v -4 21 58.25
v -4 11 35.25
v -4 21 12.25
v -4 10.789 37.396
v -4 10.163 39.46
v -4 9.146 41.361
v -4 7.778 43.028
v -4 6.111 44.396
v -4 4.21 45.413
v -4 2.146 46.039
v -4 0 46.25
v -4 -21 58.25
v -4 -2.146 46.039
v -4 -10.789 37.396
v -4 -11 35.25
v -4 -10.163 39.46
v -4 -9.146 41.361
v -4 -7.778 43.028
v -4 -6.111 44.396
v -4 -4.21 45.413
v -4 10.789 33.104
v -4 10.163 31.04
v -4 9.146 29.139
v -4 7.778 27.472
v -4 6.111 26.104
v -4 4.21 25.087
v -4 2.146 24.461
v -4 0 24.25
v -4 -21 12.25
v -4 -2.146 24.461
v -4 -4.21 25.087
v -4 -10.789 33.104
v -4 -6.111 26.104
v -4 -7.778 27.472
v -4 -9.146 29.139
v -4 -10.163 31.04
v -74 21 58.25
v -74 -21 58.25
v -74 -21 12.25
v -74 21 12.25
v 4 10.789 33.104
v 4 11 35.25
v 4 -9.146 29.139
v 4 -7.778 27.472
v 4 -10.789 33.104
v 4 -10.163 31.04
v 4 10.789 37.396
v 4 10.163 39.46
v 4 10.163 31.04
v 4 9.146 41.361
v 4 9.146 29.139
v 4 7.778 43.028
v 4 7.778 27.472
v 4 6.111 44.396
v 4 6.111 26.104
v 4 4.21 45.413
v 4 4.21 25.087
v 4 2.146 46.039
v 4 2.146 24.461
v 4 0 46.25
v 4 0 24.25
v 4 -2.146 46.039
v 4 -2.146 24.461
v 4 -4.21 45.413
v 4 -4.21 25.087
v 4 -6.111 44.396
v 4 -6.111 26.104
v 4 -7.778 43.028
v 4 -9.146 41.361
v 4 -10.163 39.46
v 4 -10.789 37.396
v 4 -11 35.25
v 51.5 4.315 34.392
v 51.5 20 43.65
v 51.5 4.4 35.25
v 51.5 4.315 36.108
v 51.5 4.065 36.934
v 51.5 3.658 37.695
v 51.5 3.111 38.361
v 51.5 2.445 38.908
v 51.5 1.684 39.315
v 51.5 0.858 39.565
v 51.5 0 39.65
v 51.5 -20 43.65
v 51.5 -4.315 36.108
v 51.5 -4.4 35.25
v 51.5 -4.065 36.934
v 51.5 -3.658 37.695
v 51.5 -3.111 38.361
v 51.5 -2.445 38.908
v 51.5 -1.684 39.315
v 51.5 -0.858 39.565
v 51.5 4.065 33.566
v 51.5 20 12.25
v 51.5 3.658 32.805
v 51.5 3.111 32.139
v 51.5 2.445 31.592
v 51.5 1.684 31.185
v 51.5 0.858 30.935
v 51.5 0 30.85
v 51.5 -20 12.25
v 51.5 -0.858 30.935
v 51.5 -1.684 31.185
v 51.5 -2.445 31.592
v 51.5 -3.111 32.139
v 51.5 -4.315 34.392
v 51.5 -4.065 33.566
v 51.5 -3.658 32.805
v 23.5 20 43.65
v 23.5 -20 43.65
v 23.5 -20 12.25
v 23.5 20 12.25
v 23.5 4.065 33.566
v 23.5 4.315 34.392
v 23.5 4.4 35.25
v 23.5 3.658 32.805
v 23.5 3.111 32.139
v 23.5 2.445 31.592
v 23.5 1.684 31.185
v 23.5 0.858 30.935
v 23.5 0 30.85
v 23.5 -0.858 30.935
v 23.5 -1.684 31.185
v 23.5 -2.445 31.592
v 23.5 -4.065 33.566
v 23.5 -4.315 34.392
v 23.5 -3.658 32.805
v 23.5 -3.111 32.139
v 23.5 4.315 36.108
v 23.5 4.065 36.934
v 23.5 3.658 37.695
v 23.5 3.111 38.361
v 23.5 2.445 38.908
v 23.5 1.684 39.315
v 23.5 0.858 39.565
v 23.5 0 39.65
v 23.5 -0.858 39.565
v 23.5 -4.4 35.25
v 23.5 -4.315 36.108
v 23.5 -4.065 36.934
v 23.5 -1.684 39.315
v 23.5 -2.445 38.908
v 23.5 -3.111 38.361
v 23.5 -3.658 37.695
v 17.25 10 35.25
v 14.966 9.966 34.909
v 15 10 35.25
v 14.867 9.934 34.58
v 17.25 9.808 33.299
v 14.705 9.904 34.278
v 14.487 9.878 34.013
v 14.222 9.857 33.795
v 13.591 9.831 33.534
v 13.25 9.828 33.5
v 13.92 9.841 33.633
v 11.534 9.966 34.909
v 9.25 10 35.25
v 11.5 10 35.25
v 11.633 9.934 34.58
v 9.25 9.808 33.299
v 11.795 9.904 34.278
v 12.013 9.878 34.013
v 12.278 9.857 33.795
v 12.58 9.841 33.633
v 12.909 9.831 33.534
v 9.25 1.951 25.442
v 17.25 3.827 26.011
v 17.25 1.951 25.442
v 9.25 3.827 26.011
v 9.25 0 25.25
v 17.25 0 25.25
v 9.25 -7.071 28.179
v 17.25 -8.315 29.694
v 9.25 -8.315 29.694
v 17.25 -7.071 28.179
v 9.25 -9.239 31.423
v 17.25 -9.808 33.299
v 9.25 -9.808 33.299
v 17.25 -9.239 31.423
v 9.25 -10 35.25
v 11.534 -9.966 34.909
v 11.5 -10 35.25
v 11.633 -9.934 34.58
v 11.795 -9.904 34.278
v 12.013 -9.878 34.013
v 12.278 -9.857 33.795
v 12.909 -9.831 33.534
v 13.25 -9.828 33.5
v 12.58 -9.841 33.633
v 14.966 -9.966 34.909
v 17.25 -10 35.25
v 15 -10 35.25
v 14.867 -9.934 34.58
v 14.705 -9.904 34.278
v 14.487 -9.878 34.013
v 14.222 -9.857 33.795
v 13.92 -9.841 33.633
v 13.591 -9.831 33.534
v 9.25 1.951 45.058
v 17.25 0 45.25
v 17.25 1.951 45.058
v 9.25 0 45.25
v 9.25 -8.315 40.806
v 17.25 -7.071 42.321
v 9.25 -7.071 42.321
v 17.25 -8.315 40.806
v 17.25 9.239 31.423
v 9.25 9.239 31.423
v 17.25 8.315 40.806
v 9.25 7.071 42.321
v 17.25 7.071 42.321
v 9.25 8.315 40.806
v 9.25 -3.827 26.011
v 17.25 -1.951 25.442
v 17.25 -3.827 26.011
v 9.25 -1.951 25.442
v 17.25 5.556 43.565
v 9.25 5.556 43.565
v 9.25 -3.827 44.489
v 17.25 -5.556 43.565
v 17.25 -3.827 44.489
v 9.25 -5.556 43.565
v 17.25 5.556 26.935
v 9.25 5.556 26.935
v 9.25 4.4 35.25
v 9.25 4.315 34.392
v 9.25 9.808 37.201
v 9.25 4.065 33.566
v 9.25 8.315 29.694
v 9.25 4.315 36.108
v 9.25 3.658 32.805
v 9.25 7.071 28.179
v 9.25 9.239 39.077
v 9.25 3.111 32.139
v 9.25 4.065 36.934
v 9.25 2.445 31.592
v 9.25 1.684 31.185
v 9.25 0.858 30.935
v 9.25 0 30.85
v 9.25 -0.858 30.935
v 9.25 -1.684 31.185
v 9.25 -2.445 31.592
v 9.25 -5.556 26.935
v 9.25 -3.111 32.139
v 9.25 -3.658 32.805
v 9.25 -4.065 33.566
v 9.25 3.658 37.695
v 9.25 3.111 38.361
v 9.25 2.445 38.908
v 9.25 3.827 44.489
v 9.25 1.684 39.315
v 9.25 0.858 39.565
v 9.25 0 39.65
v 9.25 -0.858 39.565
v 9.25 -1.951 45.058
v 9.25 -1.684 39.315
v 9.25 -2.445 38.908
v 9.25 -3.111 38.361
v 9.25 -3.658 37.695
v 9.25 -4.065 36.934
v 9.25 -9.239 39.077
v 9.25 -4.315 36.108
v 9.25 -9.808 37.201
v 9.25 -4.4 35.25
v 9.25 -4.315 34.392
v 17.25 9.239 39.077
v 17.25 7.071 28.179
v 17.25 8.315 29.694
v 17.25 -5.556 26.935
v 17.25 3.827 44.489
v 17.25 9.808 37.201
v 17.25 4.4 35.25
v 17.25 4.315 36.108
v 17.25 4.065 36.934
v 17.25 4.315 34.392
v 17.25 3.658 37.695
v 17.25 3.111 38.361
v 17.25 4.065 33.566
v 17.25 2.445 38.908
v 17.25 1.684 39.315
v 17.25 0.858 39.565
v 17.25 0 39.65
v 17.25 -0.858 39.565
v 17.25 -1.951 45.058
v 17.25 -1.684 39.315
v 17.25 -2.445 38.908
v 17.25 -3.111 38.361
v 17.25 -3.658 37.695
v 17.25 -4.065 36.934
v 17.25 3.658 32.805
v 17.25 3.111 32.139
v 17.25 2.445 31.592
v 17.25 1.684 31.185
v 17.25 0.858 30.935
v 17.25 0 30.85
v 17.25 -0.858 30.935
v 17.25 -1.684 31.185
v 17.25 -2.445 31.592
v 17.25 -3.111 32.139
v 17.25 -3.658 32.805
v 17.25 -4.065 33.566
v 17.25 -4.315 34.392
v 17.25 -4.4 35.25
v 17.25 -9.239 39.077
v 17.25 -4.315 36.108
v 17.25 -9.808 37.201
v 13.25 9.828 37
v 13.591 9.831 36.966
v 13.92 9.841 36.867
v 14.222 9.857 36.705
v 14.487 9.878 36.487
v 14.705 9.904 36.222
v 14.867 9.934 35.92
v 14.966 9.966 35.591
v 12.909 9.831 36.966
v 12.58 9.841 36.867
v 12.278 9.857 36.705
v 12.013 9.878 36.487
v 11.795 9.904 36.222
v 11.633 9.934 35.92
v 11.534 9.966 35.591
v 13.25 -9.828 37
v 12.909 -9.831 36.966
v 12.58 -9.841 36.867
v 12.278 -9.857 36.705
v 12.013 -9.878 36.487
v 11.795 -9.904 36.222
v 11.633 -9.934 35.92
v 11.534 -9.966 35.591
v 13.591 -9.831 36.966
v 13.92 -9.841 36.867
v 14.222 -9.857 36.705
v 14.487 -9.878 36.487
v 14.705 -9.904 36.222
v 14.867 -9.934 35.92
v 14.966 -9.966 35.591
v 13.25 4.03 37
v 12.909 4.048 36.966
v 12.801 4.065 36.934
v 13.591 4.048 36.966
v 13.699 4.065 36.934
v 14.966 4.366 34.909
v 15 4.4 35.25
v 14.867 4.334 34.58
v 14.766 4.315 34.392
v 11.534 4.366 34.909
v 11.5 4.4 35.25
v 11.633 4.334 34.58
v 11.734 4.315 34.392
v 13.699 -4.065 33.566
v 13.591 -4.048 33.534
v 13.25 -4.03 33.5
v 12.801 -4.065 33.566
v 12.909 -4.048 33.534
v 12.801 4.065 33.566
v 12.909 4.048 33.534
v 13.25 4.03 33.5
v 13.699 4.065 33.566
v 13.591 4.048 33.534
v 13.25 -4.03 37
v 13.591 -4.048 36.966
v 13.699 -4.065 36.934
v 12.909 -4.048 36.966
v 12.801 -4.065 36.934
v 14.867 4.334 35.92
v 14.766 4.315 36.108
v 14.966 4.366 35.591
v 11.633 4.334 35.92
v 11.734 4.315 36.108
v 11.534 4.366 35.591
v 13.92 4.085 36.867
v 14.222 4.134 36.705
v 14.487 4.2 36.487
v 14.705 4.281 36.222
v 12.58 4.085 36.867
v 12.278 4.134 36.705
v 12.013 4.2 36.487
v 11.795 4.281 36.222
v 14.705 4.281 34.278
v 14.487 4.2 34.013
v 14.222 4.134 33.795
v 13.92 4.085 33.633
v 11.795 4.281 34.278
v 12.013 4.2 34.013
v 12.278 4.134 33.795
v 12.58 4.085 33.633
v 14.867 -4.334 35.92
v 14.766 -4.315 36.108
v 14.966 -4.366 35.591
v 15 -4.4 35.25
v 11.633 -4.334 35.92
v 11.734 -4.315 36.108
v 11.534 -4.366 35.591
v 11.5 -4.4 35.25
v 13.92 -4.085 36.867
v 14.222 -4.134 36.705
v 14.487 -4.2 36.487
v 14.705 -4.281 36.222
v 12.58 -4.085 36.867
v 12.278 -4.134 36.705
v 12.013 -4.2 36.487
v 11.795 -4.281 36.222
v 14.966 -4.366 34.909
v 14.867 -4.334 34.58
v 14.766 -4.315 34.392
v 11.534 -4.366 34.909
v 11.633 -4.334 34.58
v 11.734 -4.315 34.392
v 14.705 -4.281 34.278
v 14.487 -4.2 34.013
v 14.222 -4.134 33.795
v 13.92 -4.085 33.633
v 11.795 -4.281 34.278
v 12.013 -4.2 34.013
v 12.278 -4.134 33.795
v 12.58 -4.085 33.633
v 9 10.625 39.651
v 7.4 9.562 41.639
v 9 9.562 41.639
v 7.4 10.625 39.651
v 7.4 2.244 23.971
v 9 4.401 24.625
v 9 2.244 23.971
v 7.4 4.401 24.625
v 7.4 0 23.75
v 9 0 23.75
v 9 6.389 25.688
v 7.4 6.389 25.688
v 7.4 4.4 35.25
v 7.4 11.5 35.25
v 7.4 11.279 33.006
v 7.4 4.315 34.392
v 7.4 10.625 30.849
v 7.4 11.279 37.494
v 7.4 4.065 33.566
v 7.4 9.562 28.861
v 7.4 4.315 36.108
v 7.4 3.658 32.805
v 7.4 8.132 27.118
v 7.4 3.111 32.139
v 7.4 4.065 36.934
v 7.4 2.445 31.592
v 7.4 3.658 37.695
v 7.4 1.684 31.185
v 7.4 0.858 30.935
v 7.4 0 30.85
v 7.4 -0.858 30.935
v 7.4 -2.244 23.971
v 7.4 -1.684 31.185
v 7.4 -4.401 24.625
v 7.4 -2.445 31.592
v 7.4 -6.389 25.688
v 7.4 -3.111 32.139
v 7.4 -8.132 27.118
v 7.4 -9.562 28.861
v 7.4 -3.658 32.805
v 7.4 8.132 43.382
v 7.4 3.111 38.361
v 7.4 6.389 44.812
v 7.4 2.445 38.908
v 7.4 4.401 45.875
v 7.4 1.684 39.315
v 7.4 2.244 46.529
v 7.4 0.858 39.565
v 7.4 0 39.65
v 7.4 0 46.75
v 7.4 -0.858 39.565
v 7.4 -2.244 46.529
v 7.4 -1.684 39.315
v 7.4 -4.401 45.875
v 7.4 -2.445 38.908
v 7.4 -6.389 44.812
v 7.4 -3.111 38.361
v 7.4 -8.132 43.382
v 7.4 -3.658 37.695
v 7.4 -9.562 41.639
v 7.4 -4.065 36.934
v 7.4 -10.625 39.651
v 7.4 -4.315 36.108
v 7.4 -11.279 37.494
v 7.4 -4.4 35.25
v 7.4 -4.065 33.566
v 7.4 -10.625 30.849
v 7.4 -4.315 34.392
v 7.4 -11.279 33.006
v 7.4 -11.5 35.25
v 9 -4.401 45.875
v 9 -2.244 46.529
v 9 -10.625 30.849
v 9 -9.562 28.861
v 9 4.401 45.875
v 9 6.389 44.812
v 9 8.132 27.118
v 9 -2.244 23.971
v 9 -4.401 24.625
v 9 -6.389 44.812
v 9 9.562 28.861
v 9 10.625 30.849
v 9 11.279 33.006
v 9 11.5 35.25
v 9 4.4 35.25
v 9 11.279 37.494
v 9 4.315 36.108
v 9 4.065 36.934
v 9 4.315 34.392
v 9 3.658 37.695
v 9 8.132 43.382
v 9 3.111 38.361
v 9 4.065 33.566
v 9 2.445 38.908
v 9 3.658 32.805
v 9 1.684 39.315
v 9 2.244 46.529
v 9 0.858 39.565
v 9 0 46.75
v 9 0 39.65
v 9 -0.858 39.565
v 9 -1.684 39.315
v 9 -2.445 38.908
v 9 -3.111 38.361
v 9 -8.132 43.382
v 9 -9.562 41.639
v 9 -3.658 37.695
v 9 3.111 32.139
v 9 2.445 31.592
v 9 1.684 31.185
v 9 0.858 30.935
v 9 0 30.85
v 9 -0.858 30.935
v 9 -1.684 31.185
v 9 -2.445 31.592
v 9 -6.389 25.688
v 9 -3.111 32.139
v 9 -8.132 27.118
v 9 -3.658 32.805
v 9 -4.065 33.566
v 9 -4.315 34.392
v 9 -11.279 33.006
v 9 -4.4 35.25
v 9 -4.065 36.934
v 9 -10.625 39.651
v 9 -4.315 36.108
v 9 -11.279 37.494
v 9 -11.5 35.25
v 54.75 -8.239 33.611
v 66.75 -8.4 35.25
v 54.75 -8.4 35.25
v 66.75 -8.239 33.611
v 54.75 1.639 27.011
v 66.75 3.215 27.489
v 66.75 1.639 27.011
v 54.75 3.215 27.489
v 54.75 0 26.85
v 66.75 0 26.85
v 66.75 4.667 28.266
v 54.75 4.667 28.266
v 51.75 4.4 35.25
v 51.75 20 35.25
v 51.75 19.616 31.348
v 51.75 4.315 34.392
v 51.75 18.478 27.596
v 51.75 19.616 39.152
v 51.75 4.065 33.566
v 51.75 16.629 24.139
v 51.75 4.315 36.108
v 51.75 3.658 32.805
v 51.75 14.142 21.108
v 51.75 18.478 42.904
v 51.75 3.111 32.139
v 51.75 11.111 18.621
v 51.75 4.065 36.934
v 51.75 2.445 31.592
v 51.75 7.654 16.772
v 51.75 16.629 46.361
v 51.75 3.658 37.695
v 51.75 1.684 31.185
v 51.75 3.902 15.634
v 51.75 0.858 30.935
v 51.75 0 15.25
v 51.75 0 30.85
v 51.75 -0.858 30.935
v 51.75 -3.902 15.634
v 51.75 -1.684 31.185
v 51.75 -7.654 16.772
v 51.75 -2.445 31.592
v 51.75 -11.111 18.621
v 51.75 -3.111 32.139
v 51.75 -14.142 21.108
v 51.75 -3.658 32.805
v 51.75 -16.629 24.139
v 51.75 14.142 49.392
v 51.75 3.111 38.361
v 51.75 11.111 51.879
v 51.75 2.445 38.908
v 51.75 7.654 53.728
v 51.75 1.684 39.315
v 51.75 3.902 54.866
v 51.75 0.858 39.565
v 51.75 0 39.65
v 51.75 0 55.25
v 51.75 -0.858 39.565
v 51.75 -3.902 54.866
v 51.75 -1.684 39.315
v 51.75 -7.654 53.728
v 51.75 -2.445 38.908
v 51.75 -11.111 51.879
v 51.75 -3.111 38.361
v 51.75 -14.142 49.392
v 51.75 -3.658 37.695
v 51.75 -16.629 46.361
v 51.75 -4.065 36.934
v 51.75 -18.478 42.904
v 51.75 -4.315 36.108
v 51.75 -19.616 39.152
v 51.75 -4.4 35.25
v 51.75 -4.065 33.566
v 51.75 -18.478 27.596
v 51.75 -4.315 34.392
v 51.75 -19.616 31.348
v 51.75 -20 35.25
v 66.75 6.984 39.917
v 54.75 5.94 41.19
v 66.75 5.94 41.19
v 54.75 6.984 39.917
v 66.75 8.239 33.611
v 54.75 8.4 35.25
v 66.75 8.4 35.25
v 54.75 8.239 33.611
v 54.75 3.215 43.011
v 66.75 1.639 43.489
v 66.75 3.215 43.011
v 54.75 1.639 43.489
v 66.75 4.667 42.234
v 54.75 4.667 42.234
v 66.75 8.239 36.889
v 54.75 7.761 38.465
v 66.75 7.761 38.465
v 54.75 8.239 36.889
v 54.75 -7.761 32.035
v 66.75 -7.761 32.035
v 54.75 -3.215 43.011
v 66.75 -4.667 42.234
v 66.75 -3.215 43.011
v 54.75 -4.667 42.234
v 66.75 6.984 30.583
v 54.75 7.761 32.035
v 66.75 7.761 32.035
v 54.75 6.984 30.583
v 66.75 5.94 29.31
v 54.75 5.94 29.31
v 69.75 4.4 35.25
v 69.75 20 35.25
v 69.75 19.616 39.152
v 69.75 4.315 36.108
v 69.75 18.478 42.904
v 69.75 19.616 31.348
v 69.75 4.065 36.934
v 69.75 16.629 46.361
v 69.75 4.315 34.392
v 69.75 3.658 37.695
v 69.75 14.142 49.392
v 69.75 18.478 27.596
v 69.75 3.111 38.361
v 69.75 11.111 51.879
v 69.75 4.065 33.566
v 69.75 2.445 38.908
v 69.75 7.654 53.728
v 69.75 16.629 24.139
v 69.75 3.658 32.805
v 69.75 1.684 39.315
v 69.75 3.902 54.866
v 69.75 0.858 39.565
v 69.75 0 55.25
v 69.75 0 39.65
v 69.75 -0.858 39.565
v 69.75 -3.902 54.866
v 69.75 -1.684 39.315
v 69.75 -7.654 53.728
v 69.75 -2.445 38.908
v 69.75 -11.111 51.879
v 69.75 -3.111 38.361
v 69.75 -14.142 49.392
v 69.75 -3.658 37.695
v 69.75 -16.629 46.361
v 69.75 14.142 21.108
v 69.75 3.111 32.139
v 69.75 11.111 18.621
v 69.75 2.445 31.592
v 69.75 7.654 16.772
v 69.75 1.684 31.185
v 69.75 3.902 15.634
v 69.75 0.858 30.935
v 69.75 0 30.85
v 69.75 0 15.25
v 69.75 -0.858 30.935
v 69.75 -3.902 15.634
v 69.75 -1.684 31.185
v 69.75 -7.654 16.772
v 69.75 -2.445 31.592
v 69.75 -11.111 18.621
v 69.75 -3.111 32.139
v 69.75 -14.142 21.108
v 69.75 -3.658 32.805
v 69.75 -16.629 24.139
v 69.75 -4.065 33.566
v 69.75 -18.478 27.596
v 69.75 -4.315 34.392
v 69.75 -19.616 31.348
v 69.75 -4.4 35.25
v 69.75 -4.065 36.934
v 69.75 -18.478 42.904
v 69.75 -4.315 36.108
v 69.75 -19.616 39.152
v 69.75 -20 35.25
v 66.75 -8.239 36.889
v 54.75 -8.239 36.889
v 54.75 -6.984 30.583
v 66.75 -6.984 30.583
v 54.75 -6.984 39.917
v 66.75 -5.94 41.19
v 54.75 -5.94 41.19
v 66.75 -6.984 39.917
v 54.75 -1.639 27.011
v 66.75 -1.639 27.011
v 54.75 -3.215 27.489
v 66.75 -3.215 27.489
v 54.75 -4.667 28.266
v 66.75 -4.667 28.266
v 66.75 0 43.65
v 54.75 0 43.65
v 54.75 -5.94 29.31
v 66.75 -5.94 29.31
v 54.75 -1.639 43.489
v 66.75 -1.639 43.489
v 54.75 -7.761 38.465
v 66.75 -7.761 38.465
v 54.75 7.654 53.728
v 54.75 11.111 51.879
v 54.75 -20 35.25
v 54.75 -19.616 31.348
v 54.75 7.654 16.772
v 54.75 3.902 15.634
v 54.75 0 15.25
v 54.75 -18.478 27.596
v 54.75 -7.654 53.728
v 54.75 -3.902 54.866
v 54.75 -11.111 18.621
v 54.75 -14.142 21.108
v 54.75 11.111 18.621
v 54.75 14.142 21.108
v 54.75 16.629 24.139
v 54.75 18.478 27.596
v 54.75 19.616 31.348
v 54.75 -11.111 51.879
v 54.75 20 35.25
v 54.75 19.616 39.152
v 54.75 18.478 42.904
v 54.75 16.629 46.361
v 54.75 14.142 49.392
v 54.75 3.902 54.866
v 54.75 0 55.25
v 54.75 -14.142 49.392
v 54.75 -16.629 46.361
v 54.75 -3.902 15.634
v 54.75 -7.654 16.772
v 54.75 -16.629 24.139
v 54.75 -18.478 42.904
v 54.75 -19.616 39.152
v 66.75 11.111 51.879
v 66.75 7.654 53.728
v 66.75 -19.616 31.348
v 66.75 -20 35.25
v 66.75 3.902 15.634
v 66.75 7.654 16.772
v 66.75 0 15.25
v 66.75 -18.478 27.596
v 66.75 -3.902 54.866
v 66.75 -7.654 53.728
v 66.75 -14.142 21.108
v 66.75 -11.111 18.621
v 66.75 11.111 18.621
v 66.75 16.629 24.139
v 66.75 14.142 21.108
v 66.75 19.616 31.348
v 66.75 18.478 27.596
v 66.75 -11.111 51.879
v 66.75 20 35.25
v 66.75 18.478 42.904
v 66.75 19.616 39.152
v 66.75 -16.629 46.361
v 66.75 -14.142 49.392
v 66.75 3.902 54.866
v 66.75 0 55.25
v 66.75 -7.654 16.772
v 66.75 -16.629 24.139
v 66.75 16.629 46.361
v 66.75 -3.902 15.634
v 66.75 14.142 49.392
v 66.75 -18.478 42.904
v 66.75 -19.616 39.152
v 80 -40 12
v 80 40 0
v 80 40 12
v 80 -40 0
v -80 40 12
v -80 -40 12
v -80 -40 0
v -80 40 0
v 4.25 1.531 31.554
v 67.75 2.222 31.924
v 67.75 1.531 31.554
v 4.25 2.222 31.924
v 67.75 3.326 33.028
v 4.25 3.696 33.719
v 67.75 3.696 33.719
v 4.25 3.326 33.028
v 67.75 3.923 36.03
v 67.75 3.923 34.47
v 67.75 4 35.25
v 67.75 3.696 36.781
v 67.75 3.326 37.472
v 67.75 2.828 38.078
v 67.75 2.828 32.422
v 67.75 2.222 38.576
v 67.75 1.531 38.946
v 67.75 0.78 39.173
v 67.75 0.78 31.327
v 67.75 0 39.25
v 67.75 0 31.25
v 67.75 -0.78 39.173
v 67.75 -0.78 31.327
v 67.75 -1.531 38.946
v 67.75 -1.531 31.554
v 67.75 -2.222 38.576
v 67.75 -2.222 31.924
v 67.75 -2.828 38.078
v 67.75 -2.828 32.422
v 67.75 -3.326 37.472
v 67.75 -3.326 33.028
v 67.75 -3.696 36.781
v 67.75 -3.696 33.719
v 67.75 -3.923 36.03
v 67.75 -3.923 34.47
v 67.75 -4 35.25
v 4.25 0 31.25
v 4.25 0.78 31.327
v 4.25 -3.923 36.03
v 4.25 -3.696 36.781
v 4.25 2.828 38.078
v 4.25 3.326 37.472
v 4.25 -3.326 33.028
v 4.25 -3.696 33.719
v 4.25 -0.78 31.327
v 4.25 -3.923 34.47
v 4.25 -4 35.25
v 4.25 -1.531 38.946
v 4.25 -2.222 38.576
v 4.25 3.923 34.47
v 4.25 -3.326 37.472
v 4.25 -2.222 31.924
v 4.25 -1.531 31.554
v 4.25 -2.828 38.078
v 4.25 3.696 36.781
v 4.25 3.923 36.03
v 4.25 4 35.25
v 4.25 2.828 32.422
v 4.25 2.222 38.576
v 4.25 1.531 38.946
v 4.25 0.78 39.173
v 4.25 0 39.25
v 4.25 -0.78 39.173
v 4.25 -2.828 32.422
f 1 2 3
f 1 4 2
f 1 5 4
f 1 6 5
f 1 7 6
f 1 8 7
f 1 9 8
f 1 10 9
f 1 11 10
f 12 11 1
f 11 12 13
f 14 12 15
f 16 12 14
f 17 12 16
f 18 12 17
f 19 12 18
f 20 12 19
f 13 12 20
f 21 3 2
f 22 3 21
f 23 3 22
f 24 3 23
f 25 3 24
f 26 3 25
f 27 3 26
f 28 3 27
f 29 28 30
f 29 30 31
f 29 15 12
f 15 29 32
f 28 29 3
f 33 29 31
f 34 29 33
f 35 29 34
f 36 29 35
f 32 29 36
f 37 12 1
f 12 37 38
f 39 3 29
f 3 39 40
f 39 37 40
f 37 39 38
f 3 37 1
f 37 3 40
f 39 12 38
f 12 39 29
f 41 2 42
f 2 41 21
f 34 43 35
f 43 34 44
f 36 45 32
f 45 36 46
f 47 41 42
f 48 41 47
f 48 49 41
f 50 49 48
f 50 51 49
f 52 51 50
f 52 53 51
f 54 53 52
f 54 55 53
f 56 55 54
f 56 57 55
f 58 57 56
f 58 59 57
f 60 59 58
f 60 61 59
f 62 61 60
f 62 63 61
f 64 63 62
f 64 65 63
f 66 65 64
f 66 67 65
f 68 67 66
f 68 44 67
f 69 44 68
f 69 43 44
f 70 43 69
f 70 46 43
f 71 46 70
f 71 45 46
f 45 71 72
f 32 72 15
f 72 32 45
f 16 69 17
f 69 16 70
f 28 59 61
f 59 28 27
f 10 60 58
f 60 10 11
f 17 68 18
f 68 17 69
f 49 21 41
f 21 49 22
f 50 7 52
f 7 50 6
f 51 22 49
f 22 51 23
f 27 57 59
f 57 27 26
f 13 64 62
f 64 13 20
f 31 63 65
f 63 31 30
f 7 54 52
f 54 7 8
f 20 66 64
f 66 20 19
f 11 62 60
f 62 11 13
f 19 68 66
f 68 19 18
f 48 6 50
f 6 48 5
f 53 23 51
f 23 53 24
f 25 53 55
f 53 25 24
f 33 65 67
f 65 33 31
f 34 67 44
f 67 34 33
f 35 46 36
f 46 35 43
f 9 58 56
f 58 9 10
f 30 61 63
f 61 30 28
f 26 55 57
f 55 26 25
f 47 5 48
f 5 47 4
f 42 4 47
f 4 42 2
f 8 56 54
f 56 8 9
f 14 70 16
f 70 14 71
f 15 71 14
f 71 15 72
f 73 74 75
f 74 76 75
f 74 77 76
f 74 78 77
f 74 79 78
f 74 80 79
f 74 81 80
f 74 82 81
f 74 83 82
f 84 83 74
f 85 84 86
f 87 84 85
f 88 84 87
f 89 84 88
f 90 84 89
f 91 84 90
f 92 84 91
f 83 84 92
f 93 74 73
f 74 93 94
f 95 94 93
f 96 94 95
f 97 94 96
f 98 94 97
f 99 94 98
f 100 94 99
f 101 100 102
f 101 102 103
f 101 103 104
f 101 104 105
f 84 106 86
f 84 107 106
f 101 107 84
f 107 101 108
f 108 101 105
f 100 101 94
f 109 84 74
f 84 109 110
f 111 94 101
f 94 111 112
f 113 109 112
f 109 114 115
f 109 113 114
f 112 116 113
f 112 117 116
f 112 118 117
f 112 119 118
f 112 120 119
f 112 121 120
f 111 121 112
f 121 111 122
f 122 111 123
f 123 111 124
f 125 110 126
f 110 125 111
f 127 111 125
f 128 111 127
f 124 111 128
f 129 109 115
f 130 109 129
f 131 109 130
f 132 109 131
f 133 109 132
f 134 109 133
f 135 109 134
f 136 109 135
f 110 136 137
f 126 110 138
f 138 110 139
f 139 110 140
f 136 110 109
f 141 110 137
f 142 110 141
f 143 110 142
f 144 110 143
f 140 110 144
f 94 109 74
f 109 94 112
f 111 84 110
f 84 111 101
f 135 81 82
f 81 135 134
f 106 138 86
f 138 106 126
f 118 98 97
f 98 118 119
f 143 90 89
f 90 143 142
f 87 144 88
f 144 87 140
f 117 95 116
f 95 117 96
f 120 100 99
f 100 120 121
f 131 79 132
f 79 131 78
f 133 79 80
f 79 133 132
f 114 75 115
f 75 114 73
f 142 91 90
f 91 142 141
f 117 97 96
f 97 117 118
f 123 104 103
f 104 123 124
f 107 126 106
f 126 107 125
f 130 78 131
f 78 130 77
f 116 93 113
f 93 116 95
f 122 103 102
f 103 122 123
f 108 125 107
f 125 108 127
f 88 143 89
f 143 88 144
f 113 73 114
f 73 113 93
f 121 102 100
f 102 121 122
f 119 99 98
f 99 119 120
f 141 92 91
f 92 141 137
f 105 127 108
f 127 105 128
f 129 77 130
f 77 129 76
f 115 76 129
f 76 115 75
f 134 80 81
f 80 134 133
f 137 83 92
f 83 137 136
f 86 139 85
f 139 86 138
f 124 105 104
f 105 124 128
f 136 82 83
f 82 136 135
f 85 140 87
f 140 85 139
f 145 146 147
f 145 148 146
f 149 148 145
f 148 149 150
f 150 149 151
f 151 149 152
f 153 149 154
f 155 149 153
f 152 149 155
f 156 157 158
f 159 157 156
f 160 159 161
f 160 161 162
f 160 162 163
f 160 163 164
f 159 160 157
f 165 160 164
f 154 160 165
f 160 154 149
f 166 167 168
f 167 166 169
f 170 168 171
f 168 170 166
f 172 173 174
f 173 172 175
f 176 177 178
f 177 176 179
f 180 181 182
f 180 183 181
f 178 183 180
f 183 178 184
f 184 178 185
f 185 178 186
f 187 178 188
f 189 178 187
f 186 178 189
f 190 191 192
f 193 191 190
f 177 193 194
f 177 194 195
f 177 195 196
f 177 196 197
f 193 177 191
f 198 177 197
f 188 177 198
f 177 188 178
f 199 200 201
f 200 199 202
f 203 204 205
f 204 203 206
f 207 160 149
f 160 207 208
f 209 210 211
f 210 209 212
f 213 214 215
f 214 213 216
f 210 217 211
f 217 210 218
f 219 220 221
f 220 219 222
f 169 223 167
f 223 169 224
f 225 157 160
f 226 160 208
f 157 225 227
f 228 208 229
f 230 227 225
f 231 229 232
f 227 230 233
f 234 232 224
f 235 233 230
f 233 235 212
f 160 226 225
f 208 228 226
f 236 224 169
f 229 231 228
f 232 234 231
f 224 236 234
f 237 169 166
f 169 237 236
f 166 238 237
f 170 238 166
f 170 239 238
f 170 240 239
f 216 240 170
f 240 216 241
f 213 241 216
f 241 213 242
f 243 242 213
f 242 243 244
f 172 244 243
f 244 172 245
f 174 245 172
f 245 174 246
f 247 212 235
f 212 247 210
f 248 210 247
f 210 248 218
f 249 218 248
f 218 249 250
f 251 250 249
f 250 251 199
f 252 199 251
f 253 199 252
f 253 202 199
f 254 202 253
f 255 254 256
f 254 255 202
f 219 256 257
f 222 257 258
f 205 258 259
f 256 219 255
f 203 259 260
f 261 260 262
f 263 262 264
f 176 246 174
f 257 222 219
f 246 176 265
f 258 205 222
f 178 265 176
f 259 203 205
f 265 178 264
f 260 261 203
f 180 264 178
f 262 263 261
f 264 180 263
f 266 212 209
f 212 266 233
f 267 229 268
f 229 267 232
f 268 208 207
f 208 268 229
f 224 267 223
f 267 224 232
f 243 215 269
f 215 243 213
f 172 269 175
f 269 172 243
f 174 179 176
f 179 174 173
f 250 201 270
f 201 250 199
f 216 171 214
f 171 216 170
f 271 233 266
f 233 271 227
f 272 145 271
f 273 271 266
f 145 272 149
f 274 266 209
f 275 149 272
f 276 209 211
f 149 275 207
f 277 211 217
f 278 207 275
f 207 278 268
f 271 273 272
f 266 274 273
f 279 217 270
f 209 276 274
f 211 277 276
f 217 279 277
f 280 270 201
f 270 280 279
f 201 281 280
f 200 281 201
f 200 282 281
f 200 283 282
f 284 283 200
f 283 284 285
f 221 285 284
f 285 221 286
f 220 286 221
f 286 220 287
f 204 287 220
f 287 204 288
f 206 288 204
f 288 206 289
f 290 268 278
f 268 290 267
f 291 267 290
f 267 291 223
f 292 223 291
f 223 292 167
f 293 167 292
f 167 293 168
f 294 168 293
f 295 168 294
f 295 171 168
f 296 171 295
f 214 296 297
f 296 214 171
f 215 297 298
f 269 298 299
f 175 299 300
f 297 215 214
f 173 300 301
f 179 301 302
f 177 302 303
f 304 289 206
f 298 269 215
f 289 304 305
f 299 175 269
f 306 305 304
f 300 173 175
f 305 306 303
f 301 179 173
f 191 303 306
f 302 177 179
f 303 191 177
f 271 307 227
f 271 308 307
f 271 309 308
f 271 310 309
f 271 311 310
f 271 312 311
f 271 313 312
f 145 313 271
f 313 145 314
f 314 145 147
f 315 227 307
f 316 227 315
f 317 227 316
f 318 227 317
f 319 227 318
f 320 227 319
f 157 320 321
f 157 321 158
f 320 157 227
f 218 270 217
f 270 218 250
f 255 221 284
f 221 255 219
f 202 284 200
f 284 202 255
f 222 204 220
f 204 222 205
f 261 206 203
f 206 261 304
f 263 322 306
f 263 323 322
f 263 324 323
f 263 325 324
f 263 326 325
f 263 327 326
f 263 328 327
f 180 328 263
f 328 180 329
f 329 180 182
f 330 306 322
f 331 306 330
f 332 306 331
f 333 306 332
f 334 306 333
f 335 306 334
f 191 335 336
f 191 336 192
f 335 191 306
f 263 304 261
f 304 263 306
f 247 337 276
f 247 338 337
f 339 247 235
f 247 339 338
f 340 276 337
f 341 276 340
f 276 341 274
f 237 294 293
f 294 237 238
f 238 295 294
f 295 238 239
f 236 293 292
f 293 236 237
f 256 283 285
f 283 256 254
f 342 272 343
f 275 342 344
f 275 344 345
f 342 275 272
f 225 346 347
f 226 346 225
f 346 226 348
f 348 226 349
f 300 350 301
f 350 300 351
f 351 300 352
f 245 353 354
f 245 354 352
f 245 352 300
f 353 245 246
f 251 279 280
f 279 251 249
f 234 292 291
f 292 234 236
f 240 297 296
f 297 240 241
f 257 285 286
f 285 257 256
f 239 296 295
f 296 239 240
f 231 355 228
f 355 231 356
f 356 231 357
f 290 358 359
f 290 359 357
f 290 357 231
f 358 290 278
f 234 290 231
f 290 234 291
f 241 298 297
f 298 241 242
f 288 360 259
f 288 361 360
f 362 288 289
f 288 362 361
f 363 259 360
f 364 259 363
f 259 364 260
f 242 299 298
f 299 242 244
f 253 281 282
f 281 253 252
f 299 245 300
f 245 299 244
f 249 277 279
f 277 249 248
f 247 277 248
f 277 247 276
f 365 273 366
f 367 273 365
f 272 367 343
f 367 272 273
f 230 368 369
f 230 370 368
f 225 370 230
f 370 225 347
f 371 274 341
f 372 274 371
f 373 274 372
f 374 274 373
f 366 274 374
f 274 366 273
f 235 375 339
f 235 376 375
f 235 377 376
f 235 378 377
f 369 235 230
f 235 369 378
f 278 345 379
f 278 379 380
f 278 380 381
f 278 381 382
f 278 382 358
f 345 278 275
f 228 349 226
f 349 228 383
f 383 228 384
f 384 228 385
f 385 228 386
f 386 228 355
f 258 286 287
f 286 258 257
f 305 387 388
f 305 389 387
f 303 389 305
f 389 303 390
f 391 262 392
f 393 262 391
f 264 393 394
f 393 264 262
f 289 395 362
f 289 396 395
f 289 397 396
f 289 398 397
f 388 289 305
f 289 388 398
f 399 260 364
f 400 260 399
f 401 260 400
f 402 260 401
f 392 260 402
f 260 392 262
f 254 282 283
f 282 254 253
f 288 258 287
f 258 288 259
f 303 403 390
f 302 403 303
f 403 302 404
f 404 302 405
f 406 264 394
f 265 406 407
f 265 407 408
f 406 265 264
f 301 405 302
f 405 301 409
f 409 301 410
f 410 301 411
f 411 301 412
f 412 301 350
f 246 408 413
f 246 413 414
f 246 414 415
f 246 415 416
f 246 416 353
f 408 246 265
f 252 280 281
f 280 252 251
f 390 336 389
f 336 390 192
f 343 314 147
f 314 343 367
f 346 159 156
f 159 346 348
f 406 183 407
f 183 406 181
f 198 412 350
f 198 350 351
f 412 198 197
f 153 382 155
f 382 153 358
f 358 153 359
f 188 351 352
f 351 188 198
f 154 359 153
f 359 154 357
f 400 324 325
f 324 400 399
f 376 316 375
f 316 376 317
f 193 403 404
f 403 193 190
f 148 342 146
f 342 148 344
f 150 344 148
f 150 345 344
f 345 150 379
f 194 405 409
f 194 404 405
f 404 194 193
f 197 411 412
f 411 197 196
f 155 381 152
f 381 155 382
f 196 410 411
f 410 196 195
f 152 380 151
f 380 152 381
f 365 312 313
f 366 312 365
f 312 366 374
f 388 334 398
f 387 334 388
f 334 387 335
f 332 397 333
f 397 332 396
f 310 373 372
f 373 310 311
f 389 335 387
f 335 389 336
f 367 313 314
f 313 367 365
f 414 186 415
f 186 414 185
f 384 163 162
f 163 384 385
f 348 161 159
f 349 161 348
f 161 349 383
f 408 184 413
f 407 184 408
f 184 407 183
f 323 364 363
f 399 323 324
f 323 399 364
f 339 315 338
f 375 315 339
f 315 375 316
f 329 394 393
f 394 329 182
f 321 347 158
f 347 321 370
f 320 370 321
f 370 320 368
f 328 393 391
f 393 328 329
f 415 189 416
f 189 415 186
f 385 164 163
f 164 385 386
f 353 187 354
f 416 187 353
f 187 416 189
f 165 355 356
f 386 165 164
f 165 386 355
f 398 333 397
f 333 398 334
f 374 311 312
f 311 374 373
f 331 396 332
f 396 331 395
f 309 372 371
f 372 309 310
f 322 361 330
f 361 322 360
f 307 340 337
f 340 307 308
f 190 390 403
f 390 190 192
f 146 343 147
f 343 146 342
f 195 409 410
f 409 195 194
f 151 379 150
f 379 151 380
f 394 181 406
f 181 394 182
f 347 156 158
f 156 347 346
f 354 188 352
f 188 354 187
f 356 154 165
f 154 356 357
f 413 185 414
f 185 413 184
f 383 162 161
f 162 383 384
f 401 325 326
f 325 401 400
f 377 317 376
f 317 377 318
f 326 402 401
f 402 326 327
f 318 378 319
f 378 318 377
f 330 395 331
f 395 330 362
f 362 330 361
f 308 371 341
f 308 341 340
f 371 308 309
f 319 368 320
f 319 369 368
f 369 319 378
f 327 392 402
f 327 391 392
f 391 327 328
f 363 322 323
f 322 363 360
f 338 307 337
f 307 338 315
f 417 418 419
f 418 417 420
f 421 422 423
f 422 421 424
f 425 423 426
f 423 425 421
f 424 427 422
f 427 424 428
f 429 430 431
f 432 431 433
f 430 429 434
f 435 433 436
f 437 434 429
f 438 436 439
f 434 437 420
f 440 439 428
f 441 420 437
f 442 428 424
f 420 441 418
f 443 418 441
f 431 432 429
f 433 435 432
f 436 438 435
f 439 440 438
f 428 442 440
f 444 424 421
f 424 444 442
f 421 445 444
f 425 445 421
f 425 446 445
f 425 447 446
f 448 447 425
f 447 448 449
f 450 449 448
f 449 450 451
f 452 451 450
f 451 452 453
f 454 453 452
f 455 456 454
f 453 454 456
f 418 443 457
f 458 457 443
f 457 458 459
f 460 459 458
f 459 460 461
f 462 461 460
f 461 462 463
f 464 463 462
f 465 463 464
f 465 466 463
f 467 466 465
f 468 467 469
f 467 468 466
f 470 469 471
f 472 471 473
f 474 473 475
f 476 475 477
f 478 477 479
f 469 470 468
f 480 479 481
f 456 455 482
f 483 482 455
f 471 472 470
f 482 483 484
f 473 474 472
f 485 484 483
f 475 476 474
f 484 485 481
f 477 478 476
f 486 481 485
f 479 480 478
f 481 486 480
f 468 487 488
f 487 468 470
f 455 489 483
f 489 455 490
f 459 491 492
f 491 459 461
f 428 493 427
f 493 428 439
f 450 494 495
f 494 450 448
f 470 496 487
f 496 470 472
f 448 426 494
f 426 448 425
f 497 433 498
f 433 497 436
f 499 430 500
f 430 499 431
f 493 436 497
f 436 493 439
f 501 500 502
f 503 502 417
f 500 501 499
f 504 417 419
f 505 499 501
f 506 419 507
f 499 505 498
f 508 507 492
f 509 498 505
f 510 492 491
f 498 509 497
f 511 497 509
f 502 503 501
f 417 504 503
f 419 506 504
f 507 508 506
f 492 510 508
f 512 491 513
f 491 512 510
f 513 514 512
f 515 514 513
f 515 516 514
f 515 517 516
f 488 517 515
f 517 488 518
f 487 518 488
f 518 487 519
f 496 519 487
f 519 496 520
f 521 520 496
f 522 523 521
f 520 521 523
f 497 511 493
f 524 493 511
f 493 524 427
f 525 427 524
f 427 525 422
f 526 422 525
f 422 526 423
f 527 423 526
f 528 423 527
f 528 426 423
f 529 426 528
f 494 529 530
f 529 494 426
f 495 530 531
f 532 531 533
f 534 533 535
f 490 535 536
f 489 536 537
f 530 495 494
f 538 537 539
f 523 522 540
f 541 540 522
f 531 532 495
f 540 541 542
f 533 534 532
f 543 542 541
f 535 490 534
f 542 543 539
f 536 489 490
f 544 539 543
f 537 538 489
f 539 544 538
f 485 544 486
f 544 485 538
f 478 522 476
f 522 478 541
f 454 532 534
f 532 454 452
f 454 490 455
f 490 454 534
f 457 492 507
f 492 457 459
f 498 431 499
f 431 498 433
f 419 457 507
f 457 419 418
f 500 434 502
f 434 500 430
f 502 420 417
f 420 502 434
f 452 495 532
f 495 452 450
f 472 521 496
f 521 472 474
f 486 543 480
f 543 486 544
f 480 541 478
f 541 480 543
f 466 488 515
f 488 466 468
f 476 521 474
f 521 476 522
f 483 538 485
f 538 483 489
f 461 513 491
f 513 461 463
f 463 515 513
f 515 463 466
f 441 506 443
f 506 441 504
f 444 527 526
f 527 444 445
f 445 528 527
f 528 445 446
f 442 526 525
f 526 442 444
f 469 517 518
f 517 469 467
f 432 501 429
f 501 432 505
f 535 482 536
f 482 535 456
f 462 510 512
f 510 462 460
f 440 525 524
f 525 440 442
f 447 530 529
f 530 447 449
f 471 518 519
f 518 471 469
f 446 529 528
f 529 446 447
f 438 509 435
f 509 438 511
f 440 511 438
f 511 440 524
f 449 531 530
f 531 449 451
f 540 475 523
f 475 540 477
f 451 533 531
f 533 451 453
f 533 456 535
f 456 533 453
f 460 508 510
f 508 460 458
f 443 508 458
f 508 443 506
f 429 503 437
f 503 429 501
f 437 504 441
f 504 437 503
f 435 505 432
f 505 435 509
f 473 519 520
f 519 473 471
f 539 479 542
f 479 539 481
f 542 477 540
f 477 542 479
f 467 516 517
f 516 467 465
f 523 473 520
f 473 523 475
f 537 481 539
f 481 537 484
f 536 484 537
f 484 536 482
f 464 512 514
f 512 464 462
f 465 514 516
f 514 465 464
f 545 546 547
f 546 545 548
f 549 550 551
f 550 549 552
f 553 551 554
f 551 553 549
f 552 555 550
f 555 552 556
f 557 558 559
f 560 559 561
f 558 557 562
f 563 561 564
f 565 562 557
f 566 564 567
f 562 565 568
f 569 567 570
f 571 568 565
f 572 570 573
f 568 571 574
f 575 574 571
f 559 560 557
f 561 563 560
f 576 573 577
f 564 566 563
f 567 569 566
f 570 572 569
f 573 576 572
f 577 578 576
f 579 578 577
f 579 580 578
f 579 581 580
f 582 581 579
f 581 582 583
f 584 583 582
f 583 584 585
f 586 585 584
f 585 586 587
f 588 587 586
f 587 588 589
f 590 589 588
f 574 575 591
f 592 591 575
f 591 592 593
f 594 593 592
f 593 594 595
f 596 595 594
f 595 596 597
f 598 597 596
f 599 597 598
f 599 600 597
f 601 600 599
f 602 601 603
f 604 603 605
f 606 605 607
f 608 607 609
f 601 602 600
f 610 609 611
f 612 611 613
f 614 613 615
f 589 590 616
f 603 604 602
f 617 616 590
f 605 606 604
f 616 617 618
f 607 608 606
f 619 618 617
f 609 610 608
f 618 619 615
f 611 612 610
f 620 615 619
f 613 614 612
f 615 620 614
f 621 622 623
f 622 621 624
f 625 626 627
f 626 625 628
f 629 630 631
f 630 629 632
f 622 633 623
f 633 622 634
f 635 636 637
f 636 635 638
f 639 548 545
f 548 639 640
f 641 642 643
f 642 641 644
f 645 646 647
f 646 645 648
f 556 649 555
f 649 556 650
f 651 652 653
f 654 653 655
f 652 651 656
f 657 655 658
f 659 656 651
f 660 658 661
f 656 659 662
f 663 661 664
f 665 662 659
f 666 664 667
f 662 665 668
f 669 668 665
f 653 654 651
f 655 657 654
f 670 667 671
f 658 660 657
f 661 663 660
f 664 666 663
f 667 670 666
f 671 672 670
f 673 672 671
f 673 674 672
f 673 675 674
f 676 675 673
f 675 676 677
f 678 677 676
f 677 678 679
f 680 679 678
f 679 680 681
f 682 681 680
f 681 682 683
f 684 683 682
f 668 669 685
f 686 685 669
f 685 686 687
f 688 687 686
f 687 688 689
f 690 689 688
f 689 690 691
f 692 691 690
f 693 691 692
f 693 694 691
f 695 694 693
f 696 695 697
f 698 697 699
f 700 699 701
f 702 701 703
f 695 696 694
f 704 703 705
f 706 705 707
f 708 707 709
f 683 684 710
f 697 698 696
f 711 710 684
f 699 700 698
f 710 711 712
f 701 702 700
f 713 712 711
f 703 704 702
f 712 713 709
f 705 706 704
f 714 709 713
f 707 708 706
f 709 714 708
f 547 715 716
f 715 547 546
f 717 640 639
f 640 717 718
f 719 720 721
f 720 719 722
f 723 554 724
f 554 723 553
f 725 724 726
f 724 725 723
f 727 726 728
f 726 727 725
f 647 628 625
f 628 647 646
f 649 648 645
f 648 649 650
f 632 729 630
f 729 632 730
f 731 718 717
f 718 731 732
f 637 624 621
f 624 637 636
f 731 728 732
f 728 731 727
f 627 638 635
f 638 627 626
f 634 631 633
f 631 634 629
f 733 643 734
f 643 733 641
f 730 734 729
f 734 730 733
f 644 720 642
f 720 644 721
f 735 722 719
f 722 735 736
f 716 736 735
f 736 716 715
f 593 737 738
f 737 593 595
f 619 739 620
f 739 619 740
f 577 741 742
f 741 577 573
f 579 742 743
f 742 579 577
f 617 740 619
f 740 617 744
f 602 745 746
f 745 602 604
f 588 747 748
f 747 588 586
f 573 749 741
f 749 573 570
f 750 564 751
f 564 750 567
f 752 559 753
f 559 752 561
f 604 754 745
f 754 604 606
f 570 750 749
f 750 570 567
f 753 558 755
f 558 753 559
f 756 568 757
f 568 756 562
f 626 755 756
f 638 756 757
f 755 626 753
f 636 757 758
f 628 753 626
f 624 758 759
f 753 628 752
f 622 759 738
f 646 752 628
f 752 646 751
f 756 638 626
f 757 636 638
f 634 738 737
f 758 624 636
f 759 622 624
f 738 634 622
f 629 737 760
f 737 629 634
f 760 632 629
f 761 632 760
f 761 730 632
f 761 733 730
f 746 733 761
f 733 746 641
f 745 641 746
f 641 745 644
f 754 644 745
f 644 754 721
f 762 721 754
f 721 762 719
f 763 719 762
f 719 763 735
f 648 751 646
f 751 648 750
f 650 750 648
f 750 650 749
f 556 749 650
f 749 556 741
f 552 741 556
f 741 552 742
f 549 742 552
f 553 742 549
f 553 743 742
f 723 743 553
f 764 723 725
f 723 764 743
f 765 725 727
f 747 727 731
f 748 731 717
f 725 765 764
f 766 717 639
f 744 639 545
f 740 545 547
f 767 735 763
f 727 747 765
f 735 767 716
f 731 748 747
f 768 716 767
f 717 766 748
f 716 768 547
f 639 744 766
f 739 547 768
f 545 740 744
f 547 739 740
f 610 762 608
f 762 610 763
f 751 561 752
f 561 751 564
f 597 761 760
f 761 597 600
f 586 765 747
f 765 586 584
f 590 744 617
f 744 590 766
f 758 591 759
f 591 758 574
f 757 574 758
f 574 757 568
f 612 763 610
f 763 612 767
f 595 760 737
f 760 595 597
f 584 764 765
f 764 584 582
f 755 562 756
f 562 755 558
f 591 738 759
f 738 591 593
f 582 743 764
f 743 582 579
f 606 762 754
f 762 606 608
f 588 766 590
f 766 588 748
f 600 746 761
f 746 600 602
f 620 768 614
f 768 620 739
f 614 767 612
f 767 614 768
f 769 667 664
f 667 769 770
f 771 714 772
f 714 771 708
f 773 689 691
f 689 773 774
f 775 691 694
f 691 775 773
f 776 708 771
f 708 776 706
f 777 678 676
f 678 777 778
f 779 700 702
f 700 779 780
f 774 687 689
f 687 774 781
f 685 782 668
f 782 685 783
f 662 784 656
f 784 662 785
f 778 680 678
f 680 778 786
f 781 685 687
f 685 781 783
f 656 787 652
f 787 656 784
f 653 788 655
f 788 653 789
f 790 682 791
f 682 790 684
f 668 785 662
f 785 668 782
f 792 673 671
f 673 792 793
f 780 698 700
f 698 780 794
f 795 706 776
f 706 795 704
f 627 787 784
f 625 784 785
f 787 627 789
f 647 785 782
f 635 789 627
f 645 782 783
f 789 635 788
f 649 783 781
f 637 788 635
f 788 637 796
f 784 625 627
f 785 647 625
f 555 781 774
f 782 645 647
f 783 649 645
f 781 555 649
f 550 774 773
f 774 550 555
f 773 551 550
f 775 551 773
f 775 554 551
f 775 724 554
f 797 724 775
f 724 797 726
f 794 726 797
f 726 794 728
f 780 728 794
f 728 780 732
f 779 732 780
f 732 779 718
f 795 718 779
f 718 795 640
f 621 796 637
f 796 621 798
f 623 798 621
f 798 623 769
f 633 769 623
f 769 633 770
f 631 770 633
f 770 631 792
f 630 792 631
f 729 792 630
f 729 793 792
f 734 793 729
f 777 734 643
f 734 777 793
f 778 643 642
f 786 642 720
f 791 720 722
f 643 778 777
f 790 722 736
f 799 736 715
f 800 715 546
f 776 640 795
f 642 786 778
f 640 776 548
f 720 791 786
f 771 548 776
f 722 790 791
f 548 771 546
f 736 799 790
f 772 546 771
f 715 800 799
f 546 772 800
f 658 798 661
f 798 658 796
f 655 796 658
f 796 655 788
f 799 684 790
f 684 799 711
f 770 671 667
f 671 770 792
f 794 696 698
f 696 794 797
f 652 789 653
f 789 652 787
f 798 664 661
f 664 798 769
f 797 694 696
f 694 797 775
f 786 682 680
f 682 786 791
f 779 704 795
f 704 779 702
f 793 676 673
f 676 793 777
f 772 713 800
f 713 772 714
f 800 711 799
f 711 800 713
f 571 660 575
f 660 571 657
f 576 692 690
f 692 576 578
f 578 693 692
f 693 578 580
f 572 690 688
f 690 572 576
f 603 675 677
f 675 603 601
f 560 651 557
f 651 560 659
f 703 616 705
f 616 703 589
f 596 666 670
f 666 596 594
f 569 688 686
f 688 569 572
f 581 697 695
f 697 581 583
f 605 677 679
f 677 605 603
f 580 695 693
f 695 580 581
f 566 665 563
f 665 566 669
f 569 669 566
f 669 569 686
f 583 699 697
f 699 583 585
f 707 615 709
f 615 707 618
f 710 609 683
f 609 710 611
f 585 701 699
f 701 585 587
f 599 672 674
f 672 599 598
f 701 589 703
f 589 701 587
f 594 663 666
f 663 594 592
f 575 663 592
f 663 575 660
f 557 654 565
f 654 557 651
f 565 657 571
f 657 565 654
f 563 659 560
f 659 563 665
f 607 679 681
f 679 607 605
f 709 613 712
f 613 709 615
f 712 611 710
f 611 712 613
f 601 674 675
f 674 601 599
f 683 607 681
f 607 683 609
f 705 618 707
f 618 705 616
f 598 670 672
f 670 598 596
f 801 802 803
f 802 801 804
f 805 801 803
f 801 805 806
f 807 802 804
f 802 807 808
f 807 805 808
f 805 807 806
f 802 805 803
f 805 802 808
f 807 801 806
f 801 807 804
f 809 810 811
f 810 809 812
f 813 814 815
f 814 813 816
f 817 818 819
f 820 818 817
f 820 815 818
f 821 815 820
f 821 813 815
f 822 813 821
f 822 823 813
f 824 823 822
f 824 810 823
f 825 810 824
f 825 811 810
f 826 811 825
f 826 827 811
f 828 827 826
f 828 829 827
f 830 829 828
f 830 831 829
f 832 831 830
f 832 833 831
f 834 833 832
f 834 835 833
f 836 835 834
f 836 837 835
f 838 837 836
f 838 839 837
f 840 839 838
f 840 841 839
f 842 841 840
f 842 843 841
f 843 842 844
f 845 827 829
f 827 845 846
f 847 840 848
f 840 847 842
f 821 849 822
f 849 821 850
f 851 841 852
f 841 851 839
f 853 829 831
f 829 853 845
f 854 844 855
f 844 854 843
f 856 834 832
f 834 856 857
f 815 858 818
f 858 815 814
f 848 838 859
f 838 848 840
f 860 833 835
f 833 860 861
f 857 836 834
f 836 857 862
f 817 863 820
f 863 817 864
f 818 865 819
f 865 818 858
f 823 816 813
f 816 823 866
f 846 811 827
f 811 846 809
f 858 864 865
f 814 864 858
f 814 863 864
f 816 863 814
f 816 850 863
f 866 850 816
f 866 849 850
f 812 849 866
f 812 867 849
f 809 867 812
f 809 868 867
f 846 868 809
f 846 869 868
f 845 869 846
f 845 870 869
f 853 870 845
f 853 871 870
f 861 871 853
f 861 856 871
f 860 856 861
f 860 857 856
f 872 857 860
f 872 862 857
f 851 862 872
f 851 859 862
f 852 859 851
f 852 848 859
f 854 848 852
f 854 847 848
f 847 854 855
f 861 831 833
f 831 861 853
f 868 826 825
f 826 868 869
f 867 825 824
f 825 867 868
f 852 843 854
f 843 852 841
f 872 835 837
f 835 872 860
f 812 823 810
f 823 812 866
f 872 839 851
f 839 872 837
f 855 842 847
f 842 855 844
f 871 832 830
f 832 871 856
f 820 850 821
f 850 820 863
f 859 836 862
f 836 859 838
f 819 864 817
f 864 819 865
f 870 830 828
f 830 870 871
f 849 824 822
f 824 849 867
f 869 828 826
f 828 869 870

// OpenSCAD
$fn = 32;

// ------------------------------------------------------------------------
// Motor drive station: motor 70 x 46 mm, shaft d8, pulley d40
// Every part is its own module, assembly() places every instance.
// ------------------------------------------------------------------------

// --- part 1 ---
module station_bed() {
  difference() {
    translate([-80, -40, 0]) cube([160, 80, 12]);
  }
}

// --- part 2 ---
module drive_motor() {
  union() {
    translate([-35, -21, 0]) cube([70, 42, 46]);
    translate([39, 0, 23]) rotate([0, 90, 0]) cylinder(h = 8, d = 22, center = true);
  }
}

// --- part 3 ---
module pillow_block() {
  difference() {
    translate([-14, -20, 0]) cube([28, 40, 31.4]);
    translate([0, 0, 23]) rotate([0, 90, 0]) cylinder(h = 30, d = 8.8, center = true);
  }
}

// --- part 4 ---
module drive_shaft() {
  translate([0, 0, -31.75]) cylinder(h = 63.5, d = 8);
}

// --- part 5 ---
module shaft_collar() {
  difference() {
    cylinder(h = 8, d = 20);
    translate([0, 0, -1]) cylinder(h = 10, d = 8.8);
    translate([0, 0, 4]) rotate([90, 0, 0]) cylinder(h = 22, d = 3.5, center = true);
  }
}

// --- part 6 ---
module collar_washer() {
  difference() {
      translate([0, 0, 0]) cylinder(h = 1.6, d = 23);
      translate([0, 0, -1]) cylinder(h = 3.6, d = 8.8);
    }
}

// --- part 7 ---
module drive_pulley() {
  difference() {
    union() {
      cylinder(h = 18, d = 16.8);
      cylinder(h = 3, d = 40);
      translate([0, 0, 15]) cylinder(h = 3, d = 40);
    }
    translate([0, 0, -1]) cylinder(h = 20, d = 8.8);
  }
}

// --- assembly ---
module assembly() {
  color([0.80, 0.24, 0.20]) translate([0, 0, 0]) rotate([0, 0, 0]) station_bed();
  color([0.20, 0.45, 0.75]) translate([-39, 0, 12.25]) rotate([0, 0, 0]) drive_motor();
  color([0.25, 0.62, 0.32]) translate([37.5, 0, 12.25]) rotate([0, 0, 0]) pillow_block();
  color([0.92, 0.70, 0.18]) translate([36, 0, 35.25]) rotate([0, 90, 0]) drive_shaft();
  color([0.58, 0.35, 0.70]) translate([9.25, 0, 35.25]) rotate([0, 90, 0]) shaft_collar();
  color([0.16, 0.66, 0.66]) translate([7.4, 0, 35.25]) rotate([0, 90, 0]) collar_washer();
  color([0.85, 0.48, 0.18]) translate([51.75, 0, 35.25]) rotate([0, 90, 0]) drive_pulley();
}

assembly();
